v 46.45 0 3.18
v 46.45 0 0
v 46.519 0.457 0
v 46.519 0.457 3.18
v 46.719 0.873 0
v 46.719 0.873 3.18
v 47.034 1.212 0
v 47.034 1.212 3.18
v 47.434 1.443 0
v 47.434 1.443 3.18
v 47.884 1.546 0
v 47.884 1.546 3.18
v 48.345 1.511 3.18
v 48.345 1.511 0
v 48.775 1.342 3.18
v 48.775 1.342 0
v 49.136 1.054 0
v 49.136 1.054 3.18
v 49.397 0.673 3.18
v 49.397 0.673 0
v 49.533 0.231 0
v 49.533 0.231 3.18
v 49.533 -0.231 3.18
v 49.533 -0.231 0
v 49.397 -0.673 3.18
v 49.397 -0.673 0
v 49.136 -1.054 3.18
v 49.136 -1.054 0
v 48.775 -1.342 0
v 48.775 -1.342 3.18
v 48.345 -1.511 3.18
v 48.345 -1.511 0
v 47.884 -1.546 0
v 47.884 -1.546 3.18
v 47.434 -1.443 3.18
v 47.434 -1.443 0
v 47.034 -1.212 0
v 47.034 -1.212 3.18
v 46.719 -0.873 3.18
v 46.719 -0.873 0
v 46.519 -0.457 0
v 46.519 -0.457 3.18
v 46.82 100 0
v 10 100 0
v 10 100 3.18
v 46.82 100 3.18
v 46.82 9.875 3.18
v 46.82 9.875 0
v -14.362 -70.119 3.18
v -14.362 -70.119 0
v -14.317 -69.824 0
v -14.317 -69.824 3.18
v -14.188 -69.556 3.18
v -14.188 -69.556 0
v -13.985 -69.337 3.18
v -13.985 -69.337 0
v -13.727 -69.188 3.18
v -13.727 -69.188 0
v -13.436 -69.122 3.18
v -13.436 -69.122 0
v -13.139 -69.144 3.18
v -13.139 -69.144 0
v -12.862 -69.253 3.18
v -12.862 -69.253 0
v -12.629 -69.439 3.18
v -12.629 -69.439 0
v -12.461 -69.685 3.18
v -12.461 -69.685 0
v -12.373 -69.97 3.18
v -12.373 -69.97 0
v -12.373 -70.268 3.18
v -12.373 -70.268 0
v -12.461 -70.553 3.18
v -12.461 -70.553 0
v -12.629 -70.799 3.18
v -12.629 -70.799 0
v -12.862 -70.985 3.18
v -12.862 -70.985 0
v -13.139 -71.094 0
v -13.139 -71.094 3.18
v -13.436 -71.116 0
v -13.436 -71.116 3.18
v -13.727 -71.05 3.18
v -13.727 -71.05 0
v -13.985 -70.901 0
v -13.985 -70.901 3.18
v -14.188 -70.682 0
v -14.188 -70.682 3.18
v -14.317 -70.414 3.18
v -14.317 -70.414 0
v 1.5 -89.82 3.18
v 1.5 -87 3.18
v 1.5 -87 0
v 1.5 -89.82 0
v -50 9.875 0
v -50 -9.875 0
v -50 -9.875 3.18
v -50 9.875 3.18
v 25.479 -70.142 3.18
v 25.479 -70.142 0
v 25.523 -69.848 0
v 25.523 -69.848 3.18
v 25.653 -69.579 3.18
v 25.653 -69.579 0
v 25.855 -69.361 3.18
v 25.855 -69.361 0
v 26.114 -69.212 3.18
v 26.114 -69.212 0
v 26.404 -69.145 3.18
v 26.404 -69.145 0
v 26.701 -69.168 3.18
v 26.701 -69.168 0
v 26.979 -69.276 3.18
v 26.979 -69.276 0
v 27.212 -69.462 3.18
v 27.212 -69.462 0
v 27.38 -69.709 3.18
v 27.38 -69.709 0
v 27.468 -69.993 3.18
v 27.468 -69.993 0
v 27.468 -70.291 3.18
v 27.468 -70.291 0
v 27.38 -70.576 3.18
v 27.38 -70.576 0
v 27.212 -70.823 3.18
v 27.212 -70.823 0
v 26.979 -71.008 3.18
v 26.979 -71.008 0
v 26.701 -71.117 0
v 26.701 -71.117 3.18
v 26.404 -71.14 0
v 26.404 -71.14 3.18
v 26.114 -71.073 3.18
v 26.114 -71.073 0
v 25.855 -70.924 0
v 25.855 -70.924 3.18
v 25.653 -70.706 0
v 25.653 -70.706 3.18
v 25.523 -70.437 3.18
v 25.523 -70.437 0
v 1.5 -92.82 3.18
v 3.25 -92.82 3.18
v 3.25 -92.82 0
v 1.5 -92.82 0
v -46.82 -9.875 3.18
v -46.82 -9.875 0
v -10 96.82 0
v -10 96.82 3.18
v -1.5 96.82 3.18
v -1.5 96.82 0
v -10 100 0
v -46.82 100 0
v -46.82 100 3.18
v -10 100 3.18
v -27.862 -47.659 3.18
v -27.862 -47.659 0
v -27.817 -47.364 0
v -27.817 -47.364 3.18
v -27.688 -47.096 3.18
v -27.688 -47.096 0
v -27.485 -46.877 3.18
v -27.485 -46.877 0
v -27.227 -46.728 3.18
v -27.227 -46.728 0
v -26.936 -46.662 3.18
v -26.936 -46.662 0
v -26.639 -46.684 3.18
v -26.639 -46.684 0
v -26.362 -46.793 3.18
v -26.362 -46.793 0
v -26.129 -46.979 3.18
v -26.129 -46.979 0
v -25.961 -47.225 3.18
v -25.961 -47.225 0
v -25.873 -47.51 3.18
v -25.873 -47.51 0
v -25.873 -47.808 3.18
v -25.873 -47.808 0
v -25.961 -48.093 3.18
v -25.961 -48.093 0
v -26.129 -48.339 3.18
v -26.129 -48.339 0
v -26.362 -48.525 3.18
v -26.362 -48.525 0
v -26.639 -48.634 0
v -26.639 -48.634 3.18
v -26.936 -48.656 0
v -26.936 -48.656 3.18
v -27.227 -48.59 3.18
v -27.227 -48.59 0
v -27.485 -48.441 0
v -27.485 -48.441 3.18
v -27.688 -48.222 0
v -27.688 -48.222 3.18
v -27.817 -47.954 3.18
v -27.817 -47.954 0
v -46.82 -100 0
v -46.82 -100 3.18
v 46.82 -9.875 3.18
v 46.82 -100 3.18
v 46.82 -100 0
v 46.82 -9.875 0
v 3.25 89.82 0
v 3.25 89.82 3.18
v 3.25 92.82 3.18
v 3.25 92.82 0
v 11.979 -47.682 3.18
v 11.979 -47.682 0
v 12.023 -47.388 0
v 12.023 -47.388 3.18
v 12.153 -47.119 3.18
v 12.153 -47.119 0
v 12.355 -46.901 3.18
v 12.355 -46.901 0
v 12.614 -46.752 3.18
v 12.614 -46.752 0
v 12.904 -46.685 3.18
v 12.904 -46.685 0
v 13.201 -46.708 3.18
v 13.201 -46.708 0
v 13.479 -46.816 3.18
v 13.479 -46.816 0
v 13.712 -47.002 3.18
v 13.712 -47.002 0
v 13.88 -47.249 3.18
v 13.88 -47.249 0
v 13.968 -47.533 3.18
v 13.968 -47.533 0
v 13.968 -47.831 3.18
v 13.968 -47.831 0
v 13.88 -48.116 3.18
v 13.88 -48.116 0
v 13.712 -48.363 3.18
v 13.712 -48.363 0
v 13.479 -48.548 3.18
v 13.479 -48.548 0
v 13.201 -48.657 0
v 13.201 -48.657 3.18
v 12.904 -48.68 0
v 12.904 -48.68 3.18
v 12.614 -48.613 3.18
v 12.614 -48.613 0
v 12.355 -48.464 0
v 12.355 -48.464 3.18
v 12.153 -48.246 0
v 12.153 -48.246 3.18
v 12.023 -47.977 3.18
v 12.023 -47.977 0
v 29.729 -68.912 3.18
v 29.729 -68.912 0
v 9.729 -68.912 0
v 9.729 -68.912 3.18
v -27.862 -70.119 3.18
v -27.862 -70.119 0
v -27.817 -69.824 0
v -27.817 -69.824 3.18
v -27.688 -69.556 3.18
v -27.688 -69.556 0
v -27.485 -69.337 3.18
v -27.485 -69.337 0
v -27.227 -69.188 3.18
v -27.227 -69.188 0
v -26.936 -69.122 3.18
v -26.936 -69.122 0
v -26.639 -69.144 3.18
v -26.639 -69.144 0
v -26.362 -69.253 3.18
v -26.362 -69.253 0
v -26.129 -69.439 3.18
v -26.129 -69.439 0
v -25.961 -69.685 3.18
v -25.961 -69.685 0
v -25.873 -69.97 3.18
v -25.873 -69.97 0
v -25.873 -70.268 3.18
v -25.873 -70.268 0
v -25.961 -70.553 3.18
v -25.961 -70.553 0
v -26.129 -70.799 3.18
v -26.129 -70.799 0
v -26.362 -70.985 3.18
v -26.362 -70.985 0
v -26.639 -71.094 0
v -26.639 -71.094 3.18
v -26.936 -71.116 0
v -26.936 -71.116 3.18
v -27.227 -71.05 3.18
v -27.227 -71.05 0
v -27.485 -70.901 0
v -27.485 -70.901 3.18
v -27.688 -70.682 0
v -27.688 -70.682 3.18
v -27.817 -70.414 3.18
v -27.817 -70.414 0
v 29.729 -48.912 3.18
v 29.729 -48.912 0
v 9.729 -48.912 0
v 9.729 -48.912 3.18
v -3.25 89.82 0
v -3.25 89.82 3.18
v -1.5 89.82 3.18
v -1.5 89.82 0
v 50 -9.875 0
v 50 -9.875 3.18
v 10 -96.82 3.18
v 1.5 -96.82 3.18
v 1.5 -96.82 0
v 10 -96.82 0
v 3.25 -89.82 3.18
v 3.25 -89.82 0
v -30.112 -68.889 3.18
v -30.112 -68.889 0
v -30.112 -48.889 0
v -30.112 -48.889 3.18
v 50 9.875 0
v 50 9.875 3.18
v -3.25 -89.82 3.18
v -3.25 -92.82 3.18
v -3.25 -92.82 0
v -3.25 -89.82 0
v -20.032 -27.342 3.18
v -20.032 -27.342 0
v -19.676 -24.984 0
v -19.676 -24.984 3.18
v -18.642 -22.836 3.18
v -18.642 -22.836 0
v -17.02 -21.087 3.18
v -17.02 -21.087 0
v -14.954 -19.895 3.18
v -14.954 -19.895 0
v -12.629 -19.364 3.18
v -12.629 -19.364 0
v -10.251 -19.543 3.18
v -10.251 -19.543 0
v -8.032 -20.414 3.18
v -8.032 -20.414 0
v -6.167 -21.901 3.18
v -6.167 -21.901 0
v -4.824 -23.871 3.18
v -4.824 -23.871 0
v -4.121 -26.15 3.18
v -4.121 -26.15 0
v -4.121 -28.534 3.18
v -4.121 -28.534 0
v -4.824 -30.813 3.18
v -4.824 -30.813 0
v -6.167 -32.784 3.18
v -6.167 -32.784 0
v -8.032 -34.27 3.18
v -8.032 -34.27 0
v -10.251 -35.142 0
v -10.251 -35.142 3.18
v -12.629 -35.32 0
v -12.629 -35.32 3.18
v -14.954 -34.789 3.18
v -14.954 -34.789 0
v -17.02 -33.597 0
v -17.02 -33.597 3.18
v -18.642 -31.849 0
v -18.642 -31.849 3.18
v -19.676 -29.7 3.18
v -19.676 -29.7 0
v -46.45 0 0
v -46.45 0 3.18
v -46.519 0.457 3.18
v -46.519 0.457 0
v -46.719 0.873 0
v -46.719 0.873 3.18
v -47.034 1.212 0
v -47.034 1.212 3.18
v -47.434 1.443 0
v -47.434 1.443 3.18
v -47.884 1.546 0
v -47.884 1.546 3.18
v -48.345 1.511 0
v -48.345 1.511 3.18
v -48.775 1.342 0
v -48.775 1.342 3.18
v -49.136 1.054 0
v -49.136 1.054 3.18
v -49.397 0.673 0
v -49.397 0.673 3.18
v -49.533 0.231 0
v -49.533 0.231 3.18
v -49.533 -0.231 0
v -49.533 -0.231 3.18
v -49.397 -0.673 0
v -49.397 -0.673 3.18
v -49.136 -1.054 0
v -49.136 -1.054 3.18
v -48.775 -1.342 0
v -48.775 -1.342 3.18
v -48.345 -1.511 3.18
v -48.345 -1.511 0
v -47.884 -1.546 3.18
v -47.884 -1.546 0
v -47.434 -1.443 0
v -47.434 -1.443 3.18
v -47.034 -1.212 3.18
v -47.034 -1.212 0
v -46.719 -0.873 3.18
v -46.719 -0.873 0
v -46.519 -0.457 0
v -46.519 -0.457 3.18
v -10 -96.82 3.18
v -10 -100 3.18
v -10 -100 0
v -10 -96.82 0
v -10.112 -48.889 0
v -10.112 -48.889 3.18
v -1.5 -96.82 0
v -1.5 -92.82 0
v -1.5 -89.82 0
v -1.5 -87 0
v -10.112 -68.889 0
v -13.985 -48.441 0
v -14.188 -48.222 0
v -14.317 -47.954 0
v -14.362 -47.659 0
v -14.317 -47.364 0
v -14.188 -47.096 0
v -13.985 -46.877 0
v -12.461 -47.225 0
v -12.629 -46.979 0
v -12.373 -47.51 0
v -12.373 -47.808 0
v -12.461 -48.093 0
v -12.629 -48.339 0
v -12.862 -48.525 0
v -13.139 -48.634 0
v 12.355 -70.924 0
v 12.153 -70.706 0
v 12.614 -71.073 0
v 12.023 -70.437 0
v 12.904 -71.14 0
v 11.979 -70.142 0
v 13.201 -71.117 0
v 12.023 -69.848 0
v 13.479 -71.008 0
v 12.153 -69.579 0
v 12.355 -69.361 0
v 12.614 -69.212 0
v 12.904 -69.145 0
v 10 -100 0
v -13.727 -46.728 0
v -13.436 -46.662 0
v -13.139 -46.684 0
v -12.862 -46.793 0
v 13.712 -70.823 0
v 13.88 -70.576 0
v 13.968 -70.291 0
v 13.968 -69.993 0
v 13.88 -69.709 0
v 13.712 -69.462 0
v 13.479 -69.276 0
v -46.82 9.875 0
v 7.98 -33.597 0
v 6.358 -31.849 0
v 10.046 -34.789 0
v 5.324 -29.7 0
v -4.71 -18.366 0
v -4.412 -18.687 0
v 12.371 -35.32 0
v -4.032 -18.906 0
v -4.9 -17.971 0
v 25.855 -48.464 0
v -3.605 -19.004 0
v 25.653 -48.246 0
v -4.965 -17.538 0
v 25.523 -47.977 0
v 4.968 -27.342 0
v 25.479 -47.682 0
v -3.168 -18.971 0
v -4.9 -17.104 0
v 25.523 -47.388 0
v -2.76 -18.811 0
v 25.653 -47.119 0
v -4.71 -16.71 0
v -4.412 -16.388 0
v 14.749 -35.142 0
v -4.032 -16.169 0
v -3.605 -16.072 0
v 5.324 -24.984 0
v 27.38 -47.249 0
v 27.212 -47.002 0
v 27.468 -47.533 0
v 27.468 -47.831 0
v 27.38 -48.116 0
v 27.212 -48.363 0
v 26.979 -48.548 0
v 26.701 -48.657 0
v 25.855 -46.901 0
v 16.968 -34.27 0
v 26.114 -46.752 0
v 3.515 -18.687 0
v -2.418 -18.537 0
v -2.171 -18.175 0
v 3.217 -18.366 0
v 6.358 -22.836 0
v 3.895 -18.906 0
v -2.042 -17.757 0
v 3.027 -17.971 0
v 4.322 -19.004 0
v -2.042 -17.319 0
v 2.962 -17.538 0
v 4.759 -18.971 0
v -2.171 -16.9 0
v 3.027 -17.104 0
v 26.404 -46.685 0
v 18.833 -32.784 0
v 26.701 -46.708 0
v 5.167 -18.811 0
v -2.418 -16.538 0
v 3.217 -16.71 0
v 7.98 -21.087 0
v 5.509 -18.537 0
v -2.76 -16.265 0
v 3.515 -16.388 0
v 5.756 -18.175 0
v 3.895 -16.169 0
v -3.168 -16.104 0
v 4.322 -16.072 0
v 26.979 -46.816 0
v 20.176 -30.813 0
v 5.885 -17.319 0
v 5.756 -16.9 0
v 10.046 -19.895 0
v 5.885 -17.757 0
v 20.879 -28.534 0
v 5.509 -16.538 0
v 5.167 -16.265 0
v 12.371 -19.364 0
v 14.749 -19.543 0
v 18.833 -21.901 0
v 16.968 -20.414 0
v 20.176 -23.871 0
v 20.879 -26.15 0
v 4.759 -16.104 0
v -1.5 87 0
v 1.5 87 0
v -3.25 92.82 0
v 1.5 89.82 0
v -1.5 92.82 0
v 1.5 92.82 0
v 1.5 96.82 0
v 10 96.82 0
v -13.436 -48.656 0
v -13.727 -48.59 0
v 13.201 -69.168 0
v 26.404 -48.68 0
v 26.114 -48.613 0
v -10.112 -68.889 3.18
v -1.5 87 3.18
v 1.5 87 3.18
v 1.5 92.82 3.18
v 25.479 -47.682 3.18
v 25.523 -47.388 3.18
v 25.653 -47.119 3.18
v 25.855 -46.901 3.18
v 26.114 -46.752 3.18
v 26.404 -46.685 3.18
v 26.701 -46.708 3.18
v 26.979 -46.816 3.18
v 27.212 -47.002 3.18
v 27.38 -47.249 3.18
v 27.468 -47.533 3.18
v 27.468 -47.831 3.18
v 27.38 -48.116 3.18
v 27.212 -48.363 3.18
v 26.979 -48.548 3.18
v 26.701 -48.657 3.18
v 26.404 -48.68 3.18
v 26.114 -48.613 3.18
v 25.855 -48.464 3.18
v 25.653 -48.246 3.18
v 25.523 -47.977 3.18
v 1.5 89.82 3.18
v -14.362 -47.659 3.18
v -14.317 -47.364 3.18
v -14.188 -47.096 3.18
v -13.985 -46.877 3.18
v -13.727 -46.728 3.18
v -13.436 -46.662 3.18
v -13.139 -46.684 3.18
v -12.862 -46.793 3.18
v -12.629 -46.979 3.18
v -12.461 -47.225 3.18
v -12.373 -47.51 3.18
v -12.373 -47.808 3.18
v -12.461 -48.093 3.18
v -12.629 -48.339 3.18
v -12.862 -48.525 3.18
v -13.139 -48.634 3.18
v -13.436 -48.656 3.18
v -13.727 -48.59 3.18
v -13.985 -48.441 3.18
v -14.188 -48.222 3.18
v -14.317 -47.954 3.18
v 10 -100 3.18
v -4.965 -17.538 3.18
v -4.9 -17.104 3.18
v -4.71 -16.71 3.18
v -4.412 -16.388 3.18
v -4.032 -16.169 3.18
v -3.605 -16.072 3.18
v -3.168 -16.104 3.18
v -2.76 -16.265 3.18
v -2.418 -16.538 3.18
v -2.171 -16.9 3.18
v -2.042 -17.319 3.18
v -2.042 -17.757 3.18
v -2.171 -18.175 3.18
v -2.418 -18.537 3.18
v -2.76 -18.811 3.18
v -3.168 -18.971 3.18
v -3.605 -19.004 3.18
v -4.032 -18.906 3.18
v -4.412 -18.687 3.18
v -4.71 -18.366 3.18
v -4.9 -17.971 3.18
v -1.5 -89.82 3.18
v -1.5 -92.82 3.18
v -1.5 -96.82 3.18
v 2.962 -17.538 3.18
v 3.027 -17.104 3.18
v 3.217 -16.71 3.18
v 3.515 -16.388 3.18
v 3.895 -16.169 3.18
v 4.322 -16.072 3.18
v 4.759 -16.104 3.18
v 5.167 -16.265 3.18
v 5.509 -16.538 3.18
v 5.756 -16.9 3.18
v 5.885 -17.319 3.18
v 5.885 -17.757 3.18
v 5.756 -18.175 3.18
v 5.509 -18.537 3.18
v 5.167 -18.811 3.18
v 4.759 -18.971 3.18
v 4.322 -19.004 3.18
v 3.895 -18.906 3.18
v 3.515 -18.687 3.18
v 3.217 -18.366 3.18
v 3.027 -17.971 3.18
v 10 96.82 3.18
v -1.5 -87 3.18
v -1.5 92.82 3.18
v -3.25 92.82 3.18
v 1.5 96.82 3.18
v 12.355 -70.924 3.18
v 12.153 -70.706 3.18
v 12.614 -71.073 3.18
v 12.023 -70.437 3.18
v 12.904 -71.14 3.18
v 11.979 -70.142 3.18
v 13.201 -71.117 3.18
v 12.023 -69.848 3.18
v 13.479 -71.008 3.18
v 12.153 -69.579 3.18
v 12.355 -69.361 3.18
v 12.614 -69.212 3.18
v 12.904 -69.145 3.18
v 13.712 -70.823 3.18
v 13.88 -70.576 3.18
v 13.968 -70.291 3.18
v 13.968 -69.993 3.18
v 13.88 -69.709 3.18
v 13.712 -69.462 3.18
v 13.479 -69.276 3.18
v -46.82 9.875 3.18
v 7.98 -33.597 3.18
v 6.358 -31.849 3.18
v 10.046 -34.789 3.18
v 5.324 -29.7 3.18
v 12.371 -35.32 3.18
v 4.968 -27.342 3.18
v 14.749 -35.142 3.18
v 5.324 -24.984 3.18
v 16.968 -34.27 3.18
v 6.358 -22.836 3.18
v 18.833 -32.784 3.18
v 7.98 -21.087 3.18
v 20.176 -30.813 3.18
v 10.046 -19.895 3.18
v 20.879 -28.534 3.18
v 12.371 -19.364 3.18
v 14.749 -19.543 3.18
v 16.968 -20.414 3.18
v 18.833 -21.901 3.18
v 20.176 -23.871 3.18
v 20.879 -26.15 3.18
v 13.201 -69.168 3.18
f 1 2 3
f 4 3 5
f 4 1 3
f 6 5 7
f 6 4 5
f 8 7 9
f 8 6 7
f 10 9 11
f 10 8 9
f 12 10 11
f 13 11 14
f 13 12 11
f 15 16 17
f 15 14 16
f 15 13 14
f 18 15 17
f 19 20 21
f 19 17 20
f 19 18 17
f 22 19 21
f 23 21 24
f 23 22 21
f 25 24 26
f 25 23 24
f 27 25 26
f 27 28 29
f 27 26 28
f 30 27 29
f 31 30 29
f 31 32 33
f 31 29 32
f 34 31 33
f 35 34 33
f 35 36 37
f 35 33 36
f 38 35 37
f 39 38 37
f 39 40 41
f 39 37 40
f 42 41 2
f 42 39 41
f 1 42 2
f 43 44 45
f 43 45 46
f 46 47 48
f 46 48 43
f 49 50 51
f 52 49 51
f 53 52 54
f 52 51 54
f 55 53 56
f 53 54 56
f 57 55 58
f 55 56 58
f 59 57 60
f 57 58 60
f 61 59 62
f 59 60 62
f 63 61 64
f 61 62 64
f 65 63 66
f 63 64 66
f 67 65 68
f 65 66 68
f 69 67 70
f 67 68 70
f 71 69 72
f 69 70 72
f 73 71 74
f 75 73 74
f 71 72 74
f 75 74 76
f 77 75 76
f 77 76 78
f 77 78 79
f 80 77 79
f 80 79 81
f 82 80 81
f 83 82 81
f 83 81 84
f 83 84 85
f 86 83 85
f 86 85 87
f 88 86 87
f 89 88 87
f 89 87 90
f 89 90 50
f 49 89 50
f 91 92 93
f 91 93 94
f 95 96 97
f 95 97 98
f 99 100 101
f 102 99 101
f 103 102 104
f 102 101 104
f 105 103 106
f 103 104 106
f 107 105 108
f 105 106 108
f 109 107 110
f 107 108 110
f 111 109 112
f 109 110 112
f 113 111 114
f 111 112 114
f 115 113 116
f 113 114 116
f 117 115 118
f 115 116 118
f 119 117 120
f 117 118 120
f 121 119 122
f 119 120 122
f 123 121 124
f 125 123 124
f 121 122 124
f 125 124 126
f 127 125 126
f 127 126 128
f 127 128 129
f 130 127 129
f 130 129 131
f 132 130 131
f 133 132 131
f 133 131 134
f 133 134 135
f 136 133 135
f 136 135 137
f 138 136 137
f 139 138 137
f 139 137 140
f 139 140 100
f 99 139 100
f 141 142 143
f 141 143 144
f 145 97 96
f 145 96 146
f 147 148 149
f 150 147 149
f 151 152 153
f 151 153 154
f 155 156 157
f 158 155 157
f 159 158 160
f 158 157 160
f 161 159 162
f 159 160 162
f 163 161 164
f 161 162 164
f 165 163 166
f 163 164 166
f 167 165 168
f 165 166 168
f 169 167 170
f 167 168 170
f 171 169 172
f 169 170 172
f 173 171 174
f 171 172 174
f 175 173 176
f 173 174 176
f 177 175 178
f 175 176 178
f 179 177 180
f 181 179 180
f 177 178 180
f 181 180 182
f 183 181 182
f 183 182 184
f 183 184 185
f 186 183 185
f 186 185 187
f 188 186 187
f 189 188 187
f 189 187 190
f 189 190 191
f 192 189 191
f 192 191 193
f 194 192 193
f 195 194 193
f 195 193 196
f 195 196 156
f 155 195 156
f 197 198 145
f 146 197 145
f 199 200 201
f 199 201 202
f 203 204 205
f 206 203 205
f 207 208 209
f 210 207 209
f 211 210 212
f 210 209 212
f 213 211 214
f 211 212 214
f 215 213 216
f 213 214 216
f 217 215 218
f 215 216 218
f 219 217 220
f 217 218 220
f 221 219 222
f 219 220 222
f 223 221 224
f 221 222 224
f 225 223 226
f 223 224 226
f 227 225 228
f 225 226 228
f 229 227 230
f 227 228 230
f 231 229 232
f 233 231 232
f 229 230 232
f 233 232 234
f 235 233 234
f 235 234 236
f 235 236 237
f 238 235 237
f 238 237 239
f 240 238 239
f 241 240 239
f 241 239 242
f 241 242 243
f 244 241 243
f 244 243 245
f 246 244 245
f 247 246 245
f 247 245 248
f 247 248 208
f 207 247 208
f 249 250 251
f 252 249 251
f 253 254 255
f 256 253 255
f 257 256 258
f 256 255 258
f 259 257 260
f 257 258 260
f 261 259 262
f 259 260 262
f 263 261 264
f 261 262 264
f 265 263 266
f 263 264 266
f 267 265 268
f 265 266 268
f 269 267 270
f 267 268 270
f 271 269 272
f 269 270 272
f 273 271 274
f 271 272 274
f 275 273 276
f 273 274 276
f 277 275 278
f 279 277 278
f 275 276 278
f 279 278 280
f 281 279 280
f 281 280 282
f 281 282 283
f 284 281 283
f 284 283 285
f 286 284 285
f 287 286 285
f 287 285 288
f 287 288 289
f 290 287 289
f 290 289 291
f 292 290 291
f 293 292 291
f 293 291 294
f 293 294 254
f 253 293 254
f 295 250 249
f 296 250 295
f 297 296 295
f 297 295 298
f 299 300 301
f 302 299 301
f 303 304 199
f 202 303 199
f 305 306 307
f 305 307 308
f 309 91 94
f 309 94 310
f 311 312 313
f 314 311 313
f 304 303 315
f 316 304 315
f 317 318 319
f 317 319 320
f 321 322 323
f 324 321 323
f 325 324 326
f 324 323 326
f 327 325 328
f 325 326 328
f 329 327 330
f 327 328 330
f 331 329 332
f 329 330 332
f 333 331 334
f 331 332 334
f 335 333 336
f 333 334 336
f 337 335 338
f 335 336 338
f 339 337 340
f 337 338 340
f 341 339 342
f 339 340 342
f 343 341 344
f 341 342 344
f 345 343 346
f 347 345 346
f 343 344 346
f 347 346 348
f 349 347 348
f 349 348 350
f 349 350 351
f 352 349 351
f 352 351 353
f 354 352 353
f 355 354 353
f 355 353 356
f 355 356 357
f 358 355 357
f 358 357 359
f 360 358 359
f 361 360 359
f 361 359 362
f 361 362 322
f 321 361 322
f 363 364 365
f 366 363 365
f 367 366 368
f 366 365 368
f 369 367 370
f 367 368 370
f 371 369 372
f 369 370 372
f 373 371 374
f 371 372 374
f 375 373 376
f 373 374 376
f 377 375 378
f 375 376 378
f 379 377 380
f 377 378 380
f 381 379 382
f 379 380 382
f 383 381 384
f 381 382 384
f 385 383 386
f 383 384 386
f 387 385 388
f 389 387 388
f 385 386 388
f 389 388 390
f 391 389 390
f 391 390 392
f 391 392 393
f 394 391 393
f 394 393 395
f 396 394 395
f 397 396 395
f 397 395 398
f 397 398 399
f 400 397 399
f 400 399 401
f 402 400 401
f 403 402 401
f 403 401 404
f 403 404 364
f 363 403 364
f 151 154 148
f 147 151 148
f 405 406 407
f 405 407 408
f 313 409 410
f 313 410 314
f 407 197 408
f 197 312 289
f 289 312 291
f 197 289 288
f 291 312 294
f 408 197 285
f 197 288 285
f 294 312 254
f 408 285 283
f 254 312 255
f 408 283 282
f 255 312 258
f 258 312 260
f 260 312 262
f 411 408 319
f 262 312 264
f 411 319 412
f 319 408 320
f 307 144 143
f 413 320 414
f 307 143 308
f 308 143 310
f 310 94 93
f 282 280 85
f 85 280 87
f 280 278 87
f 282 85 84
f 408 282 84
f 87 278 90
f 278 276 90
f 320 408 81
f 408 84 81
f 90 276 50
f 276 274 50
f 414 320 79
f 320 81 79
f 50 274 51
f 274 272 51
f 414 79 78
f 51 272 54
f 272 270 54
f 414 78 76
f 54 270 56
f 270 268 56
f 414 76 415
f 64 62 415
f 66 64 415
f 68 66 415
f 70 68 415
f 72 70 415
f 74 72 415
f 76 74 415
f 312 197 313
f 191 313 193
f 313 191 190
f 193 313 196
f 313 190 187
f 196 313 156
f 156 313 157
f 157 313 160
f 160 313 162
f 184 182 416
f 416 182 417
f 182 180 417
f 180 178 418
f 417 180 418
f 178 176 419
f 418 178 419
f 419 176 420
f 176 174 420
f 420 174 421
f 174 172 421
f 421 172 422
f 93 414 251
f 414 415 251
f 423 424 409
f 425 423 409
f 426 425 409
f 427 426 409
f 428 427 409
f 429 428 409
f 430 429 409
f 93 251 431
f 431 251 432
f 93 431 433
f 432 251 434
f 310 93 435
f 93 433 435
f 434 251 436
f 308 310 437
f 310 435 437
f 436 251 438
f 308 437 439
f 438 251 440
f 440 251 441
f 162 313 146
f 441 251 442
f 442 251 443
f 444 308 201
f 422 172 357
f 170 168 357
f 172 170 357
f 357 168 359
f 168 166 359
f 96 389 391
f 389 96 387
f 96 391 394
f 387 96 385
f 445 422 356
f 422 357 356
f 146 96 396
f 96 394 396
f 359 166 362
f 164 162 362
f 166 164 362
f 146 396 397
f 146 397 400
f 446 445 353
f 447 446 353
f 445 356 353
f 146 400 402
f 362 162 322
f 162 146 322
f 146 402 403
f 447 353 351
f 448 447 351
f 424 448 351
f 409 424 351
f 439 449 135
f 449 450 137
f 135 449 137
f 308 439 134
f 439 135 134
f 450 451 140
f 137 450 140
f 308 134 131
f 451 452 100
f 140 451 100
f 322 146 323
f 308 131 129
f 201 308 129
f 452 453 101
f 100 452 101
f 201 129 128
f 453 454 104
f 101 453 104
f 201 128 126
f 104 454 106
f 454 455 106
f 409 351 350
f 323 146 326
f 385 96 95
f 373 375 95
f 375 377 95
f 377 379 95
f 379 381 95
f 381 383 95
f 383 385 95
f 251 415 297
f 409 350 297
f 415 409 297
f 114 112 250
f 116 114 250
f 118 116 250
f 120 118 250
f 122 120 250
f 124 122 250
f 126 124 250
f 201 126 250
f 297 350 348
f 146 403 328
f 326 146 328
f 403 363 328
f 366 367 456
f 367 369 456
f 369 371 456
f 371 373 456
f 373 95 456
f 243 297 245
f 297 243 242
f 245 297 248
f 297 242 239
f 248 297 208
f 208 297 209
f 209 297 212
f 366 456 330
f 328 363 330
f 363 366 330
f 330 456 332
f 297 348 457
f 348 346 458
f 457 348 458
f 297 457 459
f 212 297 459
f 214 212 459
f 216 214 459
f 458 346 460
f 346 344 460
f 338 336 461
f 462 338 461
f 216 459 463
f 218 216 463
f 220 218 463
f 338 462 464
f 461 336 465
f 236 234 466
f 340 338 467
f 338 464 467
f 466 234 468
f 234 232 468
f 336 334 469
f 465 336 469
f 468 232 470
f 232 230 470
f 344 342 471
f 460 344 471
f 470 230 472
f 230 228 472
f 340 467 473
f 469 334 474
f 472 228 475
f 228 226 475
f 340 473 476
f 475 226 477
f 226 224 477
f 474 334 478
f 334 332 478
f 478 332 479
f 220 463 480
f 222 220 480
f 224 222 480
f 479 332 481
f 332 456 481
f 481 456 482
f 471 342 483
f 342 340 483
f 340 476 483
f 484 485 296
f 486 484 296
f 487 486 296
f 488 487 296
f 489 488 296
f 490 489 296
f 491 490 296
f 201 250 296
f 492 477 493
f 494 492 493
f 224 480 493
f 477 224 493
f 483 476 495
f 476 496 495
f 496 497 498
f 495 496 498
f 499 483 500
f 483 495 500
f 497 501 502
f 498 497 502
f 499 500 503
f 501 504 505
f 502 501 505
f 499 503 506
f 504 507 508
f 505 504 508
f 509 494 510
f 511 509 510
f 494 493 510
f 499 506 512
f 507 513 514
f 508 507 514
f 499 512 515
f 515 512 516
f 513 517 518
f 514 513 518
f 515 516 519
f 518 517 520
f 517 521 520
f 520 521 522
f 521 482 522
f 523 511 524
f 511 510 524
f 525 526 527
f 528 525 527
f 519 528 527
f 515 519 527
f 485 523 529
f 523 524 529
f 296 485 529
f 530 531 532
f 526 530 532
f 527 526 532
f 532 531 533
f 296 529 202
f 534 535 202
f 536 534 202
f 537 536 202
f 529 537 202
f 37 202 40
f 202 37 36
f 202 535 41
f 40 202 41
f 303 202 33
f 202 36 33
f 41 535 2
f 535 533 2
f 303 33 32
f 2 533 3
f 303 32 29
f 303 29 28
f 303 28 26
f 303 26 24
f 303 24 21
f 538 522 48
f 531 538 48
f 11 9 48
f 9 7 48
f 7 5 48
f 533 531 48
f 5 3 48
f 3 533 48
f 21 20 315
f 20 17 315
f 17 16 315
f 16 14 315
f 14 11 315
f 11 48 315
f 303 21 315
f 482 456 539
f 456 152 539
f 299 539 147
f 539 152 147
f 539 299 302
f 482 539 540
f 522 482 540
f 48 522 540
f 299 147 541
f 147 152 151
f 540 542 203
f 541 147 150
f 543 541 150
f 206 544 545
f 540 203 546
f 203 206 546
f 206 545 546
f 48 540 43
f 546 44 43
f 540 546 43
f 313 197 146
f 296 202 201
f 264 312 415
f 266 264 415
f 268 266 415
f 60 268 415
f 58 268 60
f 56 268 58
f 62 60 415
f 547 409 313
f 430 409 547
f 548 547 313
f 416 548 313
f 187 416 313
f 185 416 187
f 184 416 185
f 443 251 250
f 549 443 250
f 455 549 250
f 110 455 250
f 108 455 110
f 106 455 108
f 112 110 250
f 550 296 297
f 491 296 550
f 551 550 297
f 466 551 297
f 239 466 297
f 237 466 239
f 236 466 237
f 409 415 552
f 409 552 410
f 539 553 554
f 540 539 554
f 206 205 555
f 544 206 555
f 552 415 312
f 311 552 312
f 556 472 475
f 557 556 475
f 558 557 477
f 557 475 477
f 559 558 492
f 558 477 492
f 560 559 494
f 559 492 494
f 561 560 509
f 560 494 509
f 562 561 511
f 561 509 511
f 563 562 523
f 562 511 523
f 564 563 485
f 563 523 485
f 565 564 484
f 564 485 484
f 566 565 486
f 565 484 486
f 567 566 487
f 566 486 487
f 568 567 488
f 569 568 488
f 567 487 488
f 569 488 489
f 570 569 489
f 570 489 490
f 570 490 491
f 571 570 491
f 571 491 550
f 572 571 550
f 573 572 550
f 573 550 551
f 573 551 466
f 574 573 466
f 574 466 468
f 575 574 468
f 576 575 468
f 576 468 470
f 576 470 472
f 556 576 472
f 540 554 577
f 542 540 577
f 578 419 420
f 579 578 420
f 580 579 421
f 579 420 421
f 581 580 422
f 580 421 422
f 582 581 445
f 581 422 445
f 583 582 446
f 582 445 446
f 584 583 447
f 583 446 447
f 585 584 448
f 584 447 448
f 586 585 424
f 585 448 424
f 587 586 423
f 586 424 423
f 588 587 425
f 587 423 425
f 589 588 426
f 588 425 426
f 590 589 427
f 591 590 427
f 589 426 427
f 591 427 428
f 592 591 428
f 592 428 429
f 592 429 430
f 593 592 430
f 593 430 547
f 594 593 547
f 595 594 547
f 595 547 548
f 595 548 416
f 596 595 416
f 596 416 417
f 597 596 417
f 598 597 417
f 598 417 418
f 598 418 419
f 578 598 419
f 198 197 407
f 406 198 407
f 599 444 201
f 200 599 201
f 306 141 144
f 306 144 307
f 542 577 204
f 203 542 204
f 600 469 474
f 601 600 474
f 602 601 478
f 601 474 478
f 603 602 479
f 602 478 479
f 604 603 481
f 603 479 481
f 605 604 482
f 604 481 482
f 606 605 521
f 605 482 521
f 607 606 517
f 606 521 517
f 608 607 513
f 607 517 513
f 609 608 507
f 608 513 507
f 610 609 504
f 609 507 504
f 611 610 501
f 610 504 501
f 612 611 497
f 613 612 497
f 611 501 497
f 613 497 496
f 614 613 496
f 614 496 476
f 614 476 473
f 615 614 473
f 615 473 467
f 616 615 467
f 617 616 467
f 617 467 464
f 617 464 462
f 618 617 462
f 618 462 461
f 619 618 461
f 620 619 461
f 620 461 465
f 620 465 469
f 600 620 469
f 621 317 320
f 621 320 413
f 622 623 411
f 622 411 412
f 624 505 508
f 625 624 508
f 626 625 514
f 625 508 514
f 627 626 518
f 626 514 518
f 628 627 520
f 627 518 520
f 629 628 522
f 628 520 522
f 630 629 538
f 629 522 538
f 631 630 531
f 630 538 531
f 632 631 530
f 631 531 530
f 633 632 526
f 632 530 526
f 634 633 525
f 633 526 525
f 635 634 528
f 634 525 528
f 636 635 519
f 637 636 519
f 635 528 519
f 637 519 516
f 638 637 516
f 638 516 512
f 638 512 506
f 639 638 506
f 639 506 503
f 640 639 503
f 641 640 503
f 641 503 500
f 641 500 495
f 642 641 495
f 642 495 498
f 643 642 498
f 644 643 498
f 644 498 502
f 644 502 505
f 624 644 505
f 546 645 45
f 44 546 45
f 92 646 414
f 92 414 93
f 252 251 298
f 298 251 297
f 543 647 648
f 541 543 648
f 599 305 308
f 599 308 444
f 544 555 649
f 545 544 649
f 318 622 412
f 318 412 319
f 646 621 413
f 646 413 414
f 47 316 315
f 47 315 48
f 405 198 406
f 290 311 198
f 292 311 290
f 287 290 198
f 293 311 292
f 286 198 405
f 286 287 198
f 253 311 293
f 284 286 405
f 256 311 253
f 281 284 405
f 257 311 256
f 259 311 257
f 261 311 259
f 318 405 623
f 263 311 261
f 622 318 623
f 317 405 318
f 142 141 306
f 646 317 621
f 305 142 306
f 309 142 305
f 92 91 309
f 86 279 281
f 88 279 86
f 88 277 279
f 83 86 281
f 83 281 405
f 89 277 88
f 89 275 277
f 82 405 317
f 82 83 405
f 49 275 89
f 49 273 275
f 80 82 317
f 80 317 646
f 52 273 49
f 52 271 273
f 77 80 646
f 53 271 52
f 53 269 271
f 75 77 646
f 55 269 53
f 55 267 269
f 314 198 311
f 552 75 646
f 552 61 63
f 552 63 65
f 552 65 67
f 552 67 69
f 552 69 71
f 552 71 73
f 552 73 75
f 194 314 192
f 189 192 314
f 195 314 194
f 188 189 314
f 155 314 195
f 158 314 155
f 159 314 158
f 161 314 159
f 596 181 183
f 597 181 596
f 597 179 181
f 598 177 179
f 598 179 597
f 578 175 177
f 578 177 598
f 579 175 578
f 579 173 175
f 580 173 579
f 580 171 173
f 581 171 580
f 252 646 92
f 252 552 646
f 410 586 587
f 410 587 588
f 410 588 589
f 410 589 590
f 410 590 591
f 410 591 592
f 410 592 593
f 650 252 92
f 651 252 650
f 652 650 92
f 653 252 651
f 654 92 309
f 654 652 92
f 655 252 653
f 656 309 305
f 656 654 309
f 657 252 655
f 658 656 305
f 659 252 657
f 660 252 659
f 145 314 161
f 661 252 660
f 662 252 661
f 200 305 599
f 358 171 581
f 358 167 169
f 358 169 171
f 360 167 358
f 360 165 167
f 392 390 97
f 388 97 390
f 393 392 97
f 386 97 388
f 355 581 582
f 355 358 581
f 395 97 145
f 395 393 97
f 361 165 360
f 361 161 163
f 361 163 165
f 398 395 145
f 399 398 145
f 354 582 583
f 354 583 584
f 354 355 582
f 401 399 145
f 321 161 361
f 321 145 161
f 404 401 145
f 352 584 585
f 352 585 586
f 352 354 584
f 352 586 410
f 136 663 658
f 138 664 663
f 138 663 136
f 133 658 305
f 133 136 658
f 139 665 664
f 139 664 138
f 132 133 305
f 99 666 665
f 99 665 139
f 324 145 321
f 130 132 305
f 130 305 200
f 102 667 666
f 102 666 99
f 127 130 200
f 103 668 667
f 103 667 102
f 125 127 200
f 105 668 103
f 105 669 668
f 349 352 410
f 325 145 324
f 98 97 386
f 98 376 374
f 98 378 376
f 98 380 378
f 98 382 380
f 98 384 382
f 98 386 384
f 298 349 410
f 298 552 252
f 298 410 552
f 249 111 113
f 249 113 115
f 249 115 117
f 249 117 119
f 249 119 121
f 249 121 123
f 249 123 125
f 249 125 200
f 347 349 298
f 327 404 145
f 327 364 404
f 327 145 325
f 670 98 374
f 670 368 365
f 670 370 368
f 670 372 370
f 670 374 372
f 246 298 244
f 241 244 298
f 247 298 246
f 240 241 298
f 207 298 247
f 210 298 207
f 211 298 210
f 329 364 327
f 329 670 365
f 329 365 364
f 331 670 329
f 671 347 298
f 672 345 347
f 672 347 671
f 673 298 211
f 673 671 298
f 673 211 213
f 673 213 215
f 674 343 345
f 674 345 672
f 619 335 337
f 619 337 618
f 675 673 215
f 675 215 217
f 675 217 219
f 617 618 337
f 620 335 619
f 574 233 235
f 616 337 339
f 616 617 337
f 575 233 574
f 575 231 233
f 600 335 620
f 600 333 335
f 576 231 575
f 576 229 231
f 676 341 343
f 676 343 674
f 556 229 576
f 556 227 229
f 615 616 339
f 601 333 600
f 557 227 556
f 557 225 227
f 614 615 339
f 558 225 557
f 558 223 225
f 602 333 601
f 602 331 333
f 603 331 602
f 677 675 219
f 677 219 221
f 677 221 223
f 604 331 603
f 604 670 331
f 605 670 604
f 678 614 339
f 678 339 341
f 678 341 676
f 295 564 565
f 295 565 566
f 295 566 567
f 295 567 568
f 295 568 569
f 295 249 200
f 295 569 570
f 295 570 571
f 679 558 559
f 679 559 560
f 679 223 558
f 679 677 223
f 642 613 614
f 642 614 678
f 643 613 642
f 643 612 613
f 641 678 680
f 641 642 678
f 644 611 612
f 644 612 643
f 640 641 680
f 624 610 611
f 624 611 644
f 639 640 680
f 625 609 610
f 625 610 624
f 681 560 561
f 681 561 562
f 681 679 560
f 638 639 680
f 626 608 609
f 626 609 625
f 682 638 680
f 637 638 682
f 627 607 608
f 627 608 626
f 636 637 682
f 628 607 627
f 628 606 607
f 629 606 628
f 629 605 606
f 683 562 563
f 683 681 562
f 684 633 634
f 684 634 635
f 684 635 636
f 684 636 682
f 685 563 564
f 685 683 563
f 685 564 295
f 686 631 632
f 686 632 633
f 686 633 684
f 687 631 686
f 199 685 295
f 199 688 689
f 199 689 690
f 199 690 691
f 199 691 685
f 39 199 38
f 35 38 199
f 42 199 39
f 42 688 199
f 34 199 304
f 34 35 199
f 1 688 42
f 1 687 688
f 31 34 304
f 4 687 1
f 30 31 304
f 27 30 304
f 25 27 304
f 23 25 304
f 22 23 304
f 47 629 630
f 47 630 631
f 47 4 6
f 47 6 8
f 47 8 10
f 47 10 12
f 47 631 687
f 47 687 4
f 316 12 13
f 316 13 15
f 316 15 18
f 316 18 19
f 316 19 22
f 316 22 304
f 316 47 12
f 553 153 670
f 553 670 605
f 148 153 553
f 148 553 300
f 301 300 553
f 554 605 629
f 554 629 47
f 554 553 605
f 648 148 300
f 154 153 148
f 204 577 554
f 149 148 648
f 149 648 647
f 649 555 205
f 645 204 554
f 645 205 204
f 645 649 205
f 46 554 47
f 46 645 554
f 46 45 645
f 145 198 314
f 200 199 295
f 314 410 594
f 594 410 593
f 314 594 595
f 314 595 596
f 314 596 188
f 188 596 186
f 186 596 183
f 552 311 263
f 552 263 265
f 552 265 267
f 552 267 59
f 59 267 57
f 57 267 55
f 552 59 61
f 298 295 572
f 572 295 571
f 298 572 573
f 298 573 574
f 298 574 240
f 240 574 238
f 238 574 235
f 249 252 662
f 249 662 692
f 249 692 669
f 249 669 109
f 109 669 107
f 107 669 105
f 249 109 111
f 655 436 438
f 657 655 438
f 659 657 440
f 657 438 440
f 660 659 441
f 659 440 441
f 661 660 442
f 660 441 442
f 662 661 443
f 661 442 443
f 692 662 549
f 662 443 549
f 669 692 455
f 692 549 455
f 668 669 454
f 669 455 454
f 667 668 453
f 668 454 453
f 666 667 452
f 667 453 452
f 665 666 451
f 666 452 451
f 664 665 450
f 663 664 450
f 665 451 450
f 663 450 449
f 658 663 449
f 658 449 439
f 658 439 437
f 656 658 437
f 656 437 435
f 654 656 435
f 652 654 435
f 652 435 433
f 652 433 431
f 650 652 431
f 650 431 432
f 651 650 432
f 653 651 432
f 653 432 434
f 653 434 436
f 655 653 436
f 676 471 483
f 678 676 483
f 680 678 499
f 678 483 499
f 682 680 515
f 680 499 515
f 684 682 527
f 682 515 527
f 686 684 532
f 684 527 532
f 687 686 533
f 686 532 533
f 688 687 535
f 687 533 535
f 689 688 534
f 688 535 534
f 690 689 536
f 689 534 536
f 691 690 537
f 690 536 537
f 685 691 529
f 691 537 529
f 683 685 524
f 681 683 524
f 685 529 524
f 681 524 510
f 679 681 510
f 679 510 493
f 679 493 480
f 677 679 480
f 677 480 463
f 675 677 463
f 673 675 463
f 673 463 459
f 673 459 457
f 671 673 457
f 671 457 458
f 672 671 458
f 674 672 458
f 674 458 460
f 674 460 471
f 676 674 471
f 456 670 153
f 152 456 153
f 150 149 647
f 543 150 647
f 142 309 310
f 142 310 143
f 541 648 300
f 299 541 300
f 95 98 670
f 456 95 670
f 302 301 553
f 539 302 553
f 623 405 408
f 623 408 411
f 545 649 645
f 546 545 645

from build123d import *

# Parameters (mm, degrees)
SKETCH1_W           = 100
SKETCH1_H           = 200
BOSS_EXTRUDE2_DEPTH = 3.18
SKETCH2_R           = 1.55
SKETCH2_W           = 3.18
SKETCH2_H           = 90.125
CUT_EXTRUDE1_DEPTH  = 4.18
SKETCH4_R           = 1
CUT_EXTRUDE15_DEPTH = 10
SKETCH5_R           = 8
CUT_EXTRUDE16_DEPTH = 4.18
SKETCH6_R           = 1.47
CUT_EXTRUDE17_DEPTH = 4.18
SKETCH7_W           = 20
SKETCH7_H           = 20
CUT_EXTRUDE18_DEPTH = 4.18


with BuildPart() as part:
    # Sketch1 → Boss-Extrude2 (new body)
    with BuildSketch(Plane.XY):
        Rectangle(SKETCH1_W, SKETCH1_H)
    extrude(amount=BOSS_EXTRUDE2_DEPTH)

    # Sketch2 → Cut-Extrude1 (cut, through all)
    with BuildSketch(Plane.XY.offset(3.18)):
        with Locations((-48, 0)):
            Circle(SKETCH2_R)
        Polygon((-10, 100), (-10, 96.82), (-1.5, 96.82), (-1.5, 92.82), (-3.25, 92.82), (-3.25, 89.82), (-1.5, 89.82), (-1.5, 87), (1.5, 87), (1.5, 89.82), (3.25, 89.82), (3.25, 92.82), (1.5, 92.82), (1.5, 96.82), (10, 96.82), (10, 100), align=None)
        with Locations((-48.41, 54.9375)):
            Rectangle(SKETCH2_W, SKETCH2_H)
        with Locations((-48.41, -54.9375)):
            Rectangle(SKETCH2_W, SKETCH2_H)
    cut_extrude1 = extrude(amount=-CUT_EXTRUDE1_DEPTH, mode=Mode.SUBTRACT)

    # Mirror1: Cut-Extrude1 across plane
    add(cut_extrude1.mirror(Plane.ZX), mode=Mode.SUBTRACT)

    # Mirror3: Cut-Extrude1 across plane
    add(cut_extrude1.mirror(Plane(origin=(0, 0, 0), x_dir=(0, 0, 1), z_dir=(1, 0, 0))), mode=Mode.SUBTRACT)

    # Sketch4 → Cut-Extrude15 (cut)
    with BuildSketch(Plane(origin=(0, 0, 0), x_dir=(-1, 0, 0), z_dir=(0, 0, -1))):
        with Locations((13.361708712, -70.119061845)):
            Circle(SKETCH4_R)
        with Locations((26.861708712, -70.119061845)):
            Circle(SKETCH4_R)
        with Locations((26.861708712, -47.659061845)):
            Circle(SKETCH4_R)
        with Locations((13.361708712, -47.659061845)):
            Circle(SKETCH4_R)
        with Locations((-12.978894748, -47.682446814)):
            Circle(SKETCH4_R)
        with Locations((-26.478894748, -47.682446814)):
            Circle(SKETCH4_R)
        with Locations((-26.478894748, -70.142446814)):
            Circle(SKETCH4_R)
        with Locations((-12.978894748, -70.142446814)):
            Circle(SKETCH4_R)
    extrude(amount=-CUT_EXTRUDE15_DEPTH, mode=Mode.SUBTRACT)

    # Sketch5 → Cut-Extrude16 (cut, through all)
    with BuildSketch(Plane(origin=(0, 0, 0), x_dir=(-1, 0, 0), z_dir=(0, 0, -1))):
        with Locations((12.031607873, -27.34212165)):
            Circle(SKETCH5_R)
        with Locations((-12.968392127, -27.34212165)):
            Circle(SKETCH5_R)
    extrude(amount=-CUT_EXTRUDE16_DEPTH, mode=Mode.SUBTRACT)

    # Sketch6 → Cut-Extrude17 (cut, through all)
    with BuildSketch(Plane(origin=(0, 0, 0), x_dir=(-1, 0, 0), z_dir=(0, 0, -1))):
        with Locations((3.495113066, -17.537619805)):
            Circle(SKETCH6_R)
        with Locations((-4.43189732, -17.537619805)):
            Circle(SKETCH6_R)
    extrude(amount=-CUT_EXTRUDE17_DEPTH, mode=Mode.SUBTRACT)

    # Sketch7 → Cut-Extrude18 (cut, through all)
    with BuildSketch(Plane(origin=(0, 0, 0), x_dir=(-1, 0, 0), z_dir=(0, 0, -1))):
        with Locations((20.111708712, -58.889061845)):
            Rectangle(SKETCH7_W, SKETCH7_H)
        with Locations((-19.728894748, -58.912446814)):
            Rectangle(SKETCH7_W, SKETCH7_H)
    extrude(amount=-CUT_EXTRUDE18_DEPTH, mode=Mode.SUBTRACT)


solid = part.part
